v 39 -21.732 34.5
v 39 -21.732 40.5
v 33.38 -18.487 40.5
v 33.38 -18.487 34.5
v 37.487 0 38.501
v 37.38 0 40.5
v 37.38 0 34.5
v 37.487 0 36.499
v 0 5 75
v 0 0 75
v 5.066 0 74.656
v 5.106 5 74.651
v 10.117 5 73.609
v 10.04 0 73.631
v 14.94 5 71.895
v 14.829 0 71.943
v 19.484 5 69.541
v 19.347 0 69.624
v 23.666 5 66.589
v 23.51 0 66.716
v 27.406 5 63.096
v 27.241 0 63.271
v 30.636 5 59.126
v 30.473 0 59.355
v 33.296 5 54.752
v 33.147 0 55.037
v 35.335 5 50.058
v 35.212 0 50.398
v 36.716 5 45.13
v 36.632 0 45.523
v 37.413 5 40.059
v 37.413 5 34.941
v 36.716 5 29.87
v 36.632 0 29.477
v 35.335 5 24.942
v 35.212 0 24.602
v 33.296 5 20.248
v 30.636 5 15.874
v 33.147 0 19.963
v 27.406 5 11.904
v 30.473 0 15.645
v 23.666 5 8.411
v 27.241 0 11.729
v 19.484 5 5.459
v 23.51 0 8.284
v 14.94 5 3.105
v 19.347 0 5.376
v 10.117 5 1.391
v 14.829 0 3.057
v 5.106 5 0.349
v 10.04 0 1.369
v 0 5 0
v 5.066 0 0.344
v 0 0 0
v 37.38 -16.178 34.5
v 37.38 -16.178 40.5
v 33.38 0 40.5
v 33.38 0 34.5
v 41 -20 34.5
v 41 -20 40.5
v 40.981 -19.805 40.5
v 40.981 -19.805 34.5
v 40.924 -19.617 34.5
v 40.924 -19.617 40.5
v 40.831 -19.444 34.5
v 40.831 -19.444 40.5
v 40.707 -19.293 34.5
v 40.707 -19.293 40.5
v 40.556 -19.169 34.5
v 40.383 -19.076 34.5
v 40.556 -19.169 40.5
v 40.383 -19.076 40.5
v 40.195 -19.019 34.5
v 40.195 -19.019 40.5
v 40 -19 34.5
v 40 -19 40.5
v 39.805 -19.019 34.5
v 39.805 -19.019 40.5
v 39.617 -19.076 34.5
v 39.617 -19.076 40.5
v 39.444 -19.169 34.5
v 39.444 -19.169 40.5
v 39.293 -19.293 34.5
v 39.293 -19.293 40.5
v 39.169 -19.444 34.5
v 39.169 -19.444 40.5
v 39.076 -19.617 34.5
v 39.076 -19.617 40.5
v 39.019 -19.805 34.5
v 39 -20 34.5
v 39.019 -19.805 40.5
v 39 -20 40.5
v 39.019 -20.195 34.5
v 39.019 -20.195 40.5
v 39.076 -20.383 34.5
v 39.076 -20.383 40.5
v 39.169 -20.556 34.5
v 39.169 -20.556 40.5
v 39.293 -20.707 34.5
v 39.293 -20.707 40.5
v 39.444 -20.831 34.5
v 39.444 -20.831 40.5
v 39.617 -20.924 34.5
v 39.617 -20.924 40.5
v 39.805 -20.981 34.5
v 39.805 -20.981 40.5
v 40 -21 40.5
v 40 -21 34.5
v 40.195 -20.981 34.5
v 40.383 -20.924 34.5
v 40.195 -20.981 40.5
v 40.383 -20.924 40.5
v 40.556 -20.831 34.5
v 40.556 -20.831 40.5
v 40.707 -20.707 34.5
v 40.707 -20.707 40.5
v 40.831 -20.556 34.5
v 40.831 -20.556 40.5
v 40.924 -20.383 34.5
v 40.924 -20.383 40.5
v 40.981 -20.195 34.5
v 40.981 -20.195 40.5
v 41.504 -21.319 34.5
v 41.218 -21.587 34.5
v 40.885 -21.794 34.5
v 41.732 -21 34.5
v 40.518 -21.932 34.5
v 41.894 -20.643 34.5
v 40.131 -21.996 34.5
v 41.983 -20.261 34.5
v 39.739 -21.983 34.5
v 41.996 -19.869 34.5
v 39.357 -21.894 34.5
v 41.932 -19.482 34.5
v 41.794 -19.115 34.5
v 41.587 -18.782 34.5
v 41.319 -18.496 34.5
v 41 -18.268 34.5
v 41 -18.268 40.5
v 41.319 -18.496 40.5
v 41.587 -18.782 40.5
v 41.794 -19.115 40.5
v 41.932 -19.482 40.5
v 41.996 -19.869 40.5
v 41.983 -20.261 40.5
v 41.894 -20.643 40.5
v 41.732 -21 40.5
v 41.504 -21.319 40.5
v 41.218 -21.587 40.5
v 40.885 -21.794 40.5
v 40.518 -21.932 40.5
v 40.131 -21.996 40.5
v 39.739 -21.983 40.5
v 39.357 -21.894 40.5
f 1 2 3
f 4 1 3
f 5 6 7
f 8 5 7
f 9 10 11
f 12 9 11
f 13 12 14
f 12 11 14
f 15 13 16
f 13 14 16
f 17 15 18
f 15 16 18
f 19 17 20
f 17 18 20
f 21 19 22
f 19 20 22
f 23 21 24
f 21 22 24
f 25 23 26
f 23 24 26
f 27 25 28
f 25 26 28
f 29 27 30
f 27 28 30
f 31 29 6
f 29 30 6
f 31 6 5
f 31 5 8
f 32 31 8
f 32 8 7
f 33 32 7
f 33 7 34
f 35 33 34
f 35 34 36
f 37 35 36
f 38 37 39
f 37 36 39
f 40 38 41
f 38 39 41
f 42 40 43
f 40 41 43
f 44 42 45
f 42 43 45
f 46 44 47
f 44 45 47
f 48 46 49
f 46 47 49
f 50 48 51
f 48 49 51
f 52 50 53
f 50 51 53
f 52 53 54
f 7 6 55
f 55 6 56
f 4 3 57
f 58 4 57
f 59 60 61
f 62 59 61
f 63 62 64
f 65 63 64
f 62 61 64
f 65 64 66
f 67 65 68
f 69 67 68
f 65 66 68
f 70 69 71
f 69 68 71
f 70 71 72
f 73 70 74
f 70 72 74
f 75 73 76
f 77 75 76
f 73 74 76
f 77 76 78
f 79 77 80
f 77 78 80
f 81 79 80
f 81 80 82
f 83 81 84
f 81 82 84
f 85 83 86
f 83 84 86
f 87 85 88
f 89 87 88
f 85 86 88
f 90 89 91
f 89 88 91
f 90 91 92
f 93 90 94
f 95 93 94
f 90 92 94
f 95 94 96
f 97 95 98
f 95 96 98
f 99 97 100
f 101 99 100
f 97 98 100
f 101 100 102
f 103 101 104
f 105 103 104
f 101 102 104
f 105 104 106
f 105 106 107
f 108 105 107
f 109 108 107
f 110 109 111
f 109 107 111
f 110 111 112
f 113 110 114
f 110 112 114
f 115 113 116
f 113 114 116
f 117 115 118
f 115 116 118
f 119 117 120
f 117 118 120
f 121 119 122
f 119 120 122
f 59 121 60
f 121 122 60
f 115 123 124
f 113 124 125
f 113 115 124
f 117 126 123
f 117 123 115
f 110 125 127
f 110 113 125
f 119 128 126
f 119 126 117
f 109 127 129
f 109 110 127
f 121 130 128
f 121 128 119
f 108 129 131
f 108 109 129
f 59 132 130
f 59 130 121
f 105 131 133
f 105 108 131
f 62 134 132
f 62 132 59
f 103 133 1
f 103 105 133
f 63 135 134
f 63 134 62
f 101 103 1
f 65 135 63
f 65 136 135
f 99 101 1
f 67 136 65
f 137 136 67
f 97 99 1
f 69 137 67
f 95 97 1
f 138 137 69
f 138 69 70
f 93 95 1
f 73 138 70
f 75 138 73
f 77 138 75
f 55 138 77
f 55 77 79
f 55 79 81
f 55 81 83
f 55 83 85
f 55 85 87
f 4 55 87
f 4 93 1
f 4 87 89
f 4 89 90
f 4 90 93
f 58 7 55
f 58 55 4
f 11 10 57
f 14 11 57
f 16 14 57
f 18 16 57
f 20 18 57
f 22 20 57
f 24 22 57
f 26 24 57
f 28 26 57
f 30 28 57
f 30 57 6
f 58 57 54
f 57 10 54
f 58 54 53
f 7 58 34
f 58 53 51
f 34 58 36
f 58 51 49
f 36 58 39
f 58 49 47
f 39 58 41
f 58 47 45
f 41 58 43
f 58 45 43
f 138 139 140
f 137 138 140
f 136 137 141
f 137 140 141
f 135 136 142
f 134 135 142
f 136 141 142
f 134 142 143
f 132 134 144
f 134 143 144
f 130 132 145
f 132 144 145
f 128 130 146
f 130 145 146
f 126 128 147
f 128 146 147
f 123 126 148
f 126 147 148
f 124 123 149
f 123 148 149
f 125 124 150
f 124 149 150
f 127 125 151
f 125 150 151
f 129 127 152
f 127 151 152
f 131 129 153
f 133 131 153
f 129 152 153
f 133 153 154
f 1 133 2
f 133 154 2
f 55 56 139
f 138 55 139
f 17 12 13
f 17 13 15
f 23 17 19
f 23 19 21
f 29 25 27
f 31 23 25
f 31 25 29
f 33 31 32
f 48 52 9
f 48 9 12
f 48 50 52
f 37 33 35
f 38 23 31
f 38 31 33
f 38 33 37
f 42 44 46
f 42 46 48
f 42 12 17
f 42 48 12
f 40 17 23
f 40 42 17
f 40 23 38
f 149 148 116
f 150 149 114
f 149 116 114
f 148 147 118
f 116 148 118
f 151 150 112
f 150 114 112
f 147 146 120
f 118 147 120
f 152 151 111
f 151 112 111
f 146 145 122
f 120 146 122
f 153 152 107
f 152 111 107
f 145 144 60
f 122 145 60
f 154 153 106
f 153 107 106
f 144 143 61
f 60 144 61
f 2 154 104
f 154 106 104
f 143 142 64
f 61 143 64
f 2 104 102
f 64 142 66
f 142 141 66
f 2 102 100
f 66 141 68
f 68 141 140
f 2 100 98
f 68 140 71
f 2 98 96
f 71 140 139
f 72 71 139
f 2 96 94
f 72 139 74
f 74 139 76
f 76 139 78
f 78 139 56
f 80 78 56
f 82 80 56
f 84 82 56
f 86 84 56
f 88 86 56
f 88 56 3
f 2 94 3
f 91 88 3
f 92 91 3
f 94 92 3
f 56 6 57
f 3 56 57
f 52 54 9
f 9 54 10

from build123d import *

# Parameters (mm, degrees)
AUFSATZ_LINEAR_AUSTRAGEN1_DEPTH = 5
AUFSATZ_LINEAR_AUSTRAGEN2_DEPTH = 6
SKIZZE13_R                      = 1
SCHNITT_LINEAR_AUSTRAGEN1_DEPTH = 6


with BuildPart() as part:
    # Skizze1 → Aufsatz-Linear austragen1 (new body)
    with BuildSketch(Plane(origin=(0, 0, 0), x_dir=(1, 0, 0), z_dir=(0, 1, 0))):
        with BuildLine():
            Line((0, 0), (0, -75))
            ThreePointArc((0, -75), (37.5, -37.5), (0, 0))
        make_face()
    extrude(amount=AUFSATZ_LINEAR_AUSTRAGEN1_DEPTH)

    # Skizze12 → Aufsatz-Linear austragen2 (add)
    with BuildSketch(Plane(origin=(37.379807383, 0, 40.5), x_dir=(1, 0, 0), z_dir=(0, 0, 1))):
        with BuildLine():
            Line((0, 0), (0, -16.177830011))
            Line((0, -16.177830011), (3.620192617, -18.267949192))
            ThreePointArc((3.620192617, -18.267949192), (4.352243424, -21), (1.620192617, -21.732050808))
            Line((1.620192617, -21.732050808), (-4, -18.487231087))
            Line((-4, -18.487231087), (-4, 0))
            Line((-4, 0), (0, 0))
        make_face()
    extrude(amount=-AUFSATZ_LINEAR_AUSTRAGEN2_DEPTH)

    # Skizze13 → Schnitt-Linear austragen1 (cut)
    with BuildSketch(Plane(origin=(37.379807383, 0, 40.5), x_dir=(1, 0, 0), z_dir=(0, 0, 1))):
        with Locations((2.620192617, -20)):
            Circle(SKIZZE13_R)
    extrude(amount=-SCHNITT_LINEAR_AUSTRAGEN1_DEPTH, mode=Mode.SUBTRACT)


solid = part.part
